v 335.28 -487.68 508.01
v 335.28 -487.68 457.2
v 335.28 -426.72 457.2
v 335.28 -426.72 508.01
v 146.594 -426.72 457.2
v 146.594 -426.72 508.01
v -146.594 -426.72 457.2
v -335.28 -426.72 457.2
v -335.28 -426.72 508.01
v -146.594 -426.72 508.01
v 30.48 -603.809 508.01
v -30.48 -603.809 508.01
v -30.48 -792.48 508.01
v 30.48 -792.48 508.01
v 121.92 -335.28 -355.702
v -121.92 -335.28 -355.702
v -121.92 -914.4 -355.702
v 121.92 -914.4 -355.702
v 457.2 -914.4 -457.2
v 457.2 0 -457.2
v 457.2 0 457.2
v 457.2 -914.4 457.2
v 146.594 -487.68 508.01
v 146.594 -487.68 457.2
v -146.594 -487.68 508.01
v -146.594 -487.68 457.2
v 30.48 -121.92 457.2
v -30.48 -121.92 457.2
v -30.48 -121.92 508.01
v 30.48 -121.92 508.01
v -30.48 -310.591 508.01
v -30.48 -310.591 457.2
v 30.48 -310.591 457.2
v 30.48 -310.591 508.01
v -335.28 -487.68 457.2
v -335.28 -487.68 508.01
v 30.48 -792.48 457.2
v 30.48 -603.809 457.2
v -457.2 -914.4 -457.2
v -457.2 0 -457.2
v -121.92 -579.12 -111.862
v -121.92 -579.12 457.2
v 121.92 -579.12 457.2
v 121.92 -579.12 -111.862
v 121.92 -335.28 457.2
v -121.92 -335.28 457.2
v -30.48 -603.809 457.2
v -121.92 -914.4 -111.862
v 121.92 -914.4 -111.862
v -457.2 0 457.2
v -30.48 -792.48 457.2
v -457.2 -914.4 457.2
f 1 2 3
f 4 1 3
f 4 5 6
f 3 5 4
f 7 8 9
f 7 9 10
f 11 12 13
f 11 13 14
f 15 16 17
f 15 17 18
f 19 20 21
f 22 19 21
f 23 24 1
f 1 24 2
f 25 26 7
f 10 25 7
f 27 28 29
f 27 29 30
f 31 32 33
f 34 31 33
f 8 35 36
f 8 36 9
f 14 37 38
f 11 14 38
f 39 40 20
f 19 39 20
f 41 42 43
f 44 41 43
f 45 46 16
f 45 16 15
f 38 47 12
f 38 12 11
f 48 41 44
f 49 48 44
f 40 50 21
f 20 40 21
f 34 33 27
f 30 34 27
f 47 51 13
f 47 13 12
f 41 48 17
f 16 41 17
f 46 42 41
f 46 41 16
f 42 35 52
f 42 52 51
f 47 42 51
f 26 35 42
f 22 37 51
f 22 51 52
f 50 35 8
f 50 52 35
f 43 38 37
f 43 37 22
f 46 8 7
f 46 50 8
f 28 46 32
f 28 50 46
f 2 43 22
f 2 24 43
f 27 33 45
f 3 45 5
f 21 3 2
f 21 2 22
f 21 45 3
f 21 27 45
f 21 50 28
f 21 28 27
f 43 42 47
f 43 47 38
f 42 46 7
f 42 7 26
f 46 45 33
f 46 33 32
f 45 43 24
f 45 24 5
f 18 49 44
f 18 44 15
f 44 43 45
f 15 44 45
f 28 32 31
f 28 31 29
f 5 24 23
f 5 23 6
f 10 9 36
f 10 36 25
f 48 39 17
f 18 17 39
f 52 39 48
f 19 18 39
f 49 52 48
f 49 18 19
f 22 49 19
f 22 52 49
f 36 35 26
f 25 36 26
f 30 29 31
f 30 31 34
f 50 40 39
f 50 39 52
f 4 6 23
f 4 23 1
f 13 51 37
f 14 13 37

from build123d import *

# Parameters (mm, degrees)
F0_W          = 914.4
F0_H          = 914.4
F1_DEPTH      = 914.4
F2_W          = 243.84
F2_H          = 243.84
F3_DEPTH      = 335.28
F4_W          = 243.84
F4_H          = 243.84
F5_DEPTH      = 812.9016
F6_W          = 188.6856555939
F6_H          = 60.96
F6_W_2        = 60.96
F6_H_2        = 188.6712
F7_DEPTH      = 50.81016
F7_DEPTH_BACK = 30.48


# Not quite as in the source:
# - a feature names something its author has since deleted; it is built from what else it names


with BuildPart() as f1:
    # F0 (on Front) → F1 (new body)
    with BuildSketch(Plane.XZ):
        Rectangle(F0_W, F0_H)
    extrude(amount=F1_DEPTH)

    # F2 (on face) → F3 (cut)
    with BuildSketch(Plane.XZ.offset(914.4)):
        with Locations((0, -233.7816)):
            Rectangle(F2_W, F2_H)
    extrude(amount=-F3_DEPTH, mode=Mode.SUBTRACT)

    # F4 (on face) → F5 (cut)
    with BuildSketch(Plane.XY.offset(457.2)):
        with Locations((0, -457.2)):
            Rectangle(F4_W, F4_H)
    extrude(amount=-F5_DEPTH, mode=Mode.SUBTRACT)

    # F6 (on face) → F7 (join, two sides)
    with BuildSketch(Plane.XY.offset(457.2)) as f7_sk:
        with Locations((240.9371722031, -457.2)):
            Rectangle(F6_W, F6_H)
        with Locations((0, -216.2556)):
            Rectangle(F6_W_2, F6_H_2)
        with Locations((-240.9371722031, -457.2)):
            Rectangle(F6_W, F6_H)
        with Locations((0, -698.1444)):
            Rectangle(F6_W_2, F6_H_2)
    extrude(amount=F7_DEPTH)
    extrude(f7_sk.sketch, amount=-F7_DEPTH_BACK)


solid = f1.part
